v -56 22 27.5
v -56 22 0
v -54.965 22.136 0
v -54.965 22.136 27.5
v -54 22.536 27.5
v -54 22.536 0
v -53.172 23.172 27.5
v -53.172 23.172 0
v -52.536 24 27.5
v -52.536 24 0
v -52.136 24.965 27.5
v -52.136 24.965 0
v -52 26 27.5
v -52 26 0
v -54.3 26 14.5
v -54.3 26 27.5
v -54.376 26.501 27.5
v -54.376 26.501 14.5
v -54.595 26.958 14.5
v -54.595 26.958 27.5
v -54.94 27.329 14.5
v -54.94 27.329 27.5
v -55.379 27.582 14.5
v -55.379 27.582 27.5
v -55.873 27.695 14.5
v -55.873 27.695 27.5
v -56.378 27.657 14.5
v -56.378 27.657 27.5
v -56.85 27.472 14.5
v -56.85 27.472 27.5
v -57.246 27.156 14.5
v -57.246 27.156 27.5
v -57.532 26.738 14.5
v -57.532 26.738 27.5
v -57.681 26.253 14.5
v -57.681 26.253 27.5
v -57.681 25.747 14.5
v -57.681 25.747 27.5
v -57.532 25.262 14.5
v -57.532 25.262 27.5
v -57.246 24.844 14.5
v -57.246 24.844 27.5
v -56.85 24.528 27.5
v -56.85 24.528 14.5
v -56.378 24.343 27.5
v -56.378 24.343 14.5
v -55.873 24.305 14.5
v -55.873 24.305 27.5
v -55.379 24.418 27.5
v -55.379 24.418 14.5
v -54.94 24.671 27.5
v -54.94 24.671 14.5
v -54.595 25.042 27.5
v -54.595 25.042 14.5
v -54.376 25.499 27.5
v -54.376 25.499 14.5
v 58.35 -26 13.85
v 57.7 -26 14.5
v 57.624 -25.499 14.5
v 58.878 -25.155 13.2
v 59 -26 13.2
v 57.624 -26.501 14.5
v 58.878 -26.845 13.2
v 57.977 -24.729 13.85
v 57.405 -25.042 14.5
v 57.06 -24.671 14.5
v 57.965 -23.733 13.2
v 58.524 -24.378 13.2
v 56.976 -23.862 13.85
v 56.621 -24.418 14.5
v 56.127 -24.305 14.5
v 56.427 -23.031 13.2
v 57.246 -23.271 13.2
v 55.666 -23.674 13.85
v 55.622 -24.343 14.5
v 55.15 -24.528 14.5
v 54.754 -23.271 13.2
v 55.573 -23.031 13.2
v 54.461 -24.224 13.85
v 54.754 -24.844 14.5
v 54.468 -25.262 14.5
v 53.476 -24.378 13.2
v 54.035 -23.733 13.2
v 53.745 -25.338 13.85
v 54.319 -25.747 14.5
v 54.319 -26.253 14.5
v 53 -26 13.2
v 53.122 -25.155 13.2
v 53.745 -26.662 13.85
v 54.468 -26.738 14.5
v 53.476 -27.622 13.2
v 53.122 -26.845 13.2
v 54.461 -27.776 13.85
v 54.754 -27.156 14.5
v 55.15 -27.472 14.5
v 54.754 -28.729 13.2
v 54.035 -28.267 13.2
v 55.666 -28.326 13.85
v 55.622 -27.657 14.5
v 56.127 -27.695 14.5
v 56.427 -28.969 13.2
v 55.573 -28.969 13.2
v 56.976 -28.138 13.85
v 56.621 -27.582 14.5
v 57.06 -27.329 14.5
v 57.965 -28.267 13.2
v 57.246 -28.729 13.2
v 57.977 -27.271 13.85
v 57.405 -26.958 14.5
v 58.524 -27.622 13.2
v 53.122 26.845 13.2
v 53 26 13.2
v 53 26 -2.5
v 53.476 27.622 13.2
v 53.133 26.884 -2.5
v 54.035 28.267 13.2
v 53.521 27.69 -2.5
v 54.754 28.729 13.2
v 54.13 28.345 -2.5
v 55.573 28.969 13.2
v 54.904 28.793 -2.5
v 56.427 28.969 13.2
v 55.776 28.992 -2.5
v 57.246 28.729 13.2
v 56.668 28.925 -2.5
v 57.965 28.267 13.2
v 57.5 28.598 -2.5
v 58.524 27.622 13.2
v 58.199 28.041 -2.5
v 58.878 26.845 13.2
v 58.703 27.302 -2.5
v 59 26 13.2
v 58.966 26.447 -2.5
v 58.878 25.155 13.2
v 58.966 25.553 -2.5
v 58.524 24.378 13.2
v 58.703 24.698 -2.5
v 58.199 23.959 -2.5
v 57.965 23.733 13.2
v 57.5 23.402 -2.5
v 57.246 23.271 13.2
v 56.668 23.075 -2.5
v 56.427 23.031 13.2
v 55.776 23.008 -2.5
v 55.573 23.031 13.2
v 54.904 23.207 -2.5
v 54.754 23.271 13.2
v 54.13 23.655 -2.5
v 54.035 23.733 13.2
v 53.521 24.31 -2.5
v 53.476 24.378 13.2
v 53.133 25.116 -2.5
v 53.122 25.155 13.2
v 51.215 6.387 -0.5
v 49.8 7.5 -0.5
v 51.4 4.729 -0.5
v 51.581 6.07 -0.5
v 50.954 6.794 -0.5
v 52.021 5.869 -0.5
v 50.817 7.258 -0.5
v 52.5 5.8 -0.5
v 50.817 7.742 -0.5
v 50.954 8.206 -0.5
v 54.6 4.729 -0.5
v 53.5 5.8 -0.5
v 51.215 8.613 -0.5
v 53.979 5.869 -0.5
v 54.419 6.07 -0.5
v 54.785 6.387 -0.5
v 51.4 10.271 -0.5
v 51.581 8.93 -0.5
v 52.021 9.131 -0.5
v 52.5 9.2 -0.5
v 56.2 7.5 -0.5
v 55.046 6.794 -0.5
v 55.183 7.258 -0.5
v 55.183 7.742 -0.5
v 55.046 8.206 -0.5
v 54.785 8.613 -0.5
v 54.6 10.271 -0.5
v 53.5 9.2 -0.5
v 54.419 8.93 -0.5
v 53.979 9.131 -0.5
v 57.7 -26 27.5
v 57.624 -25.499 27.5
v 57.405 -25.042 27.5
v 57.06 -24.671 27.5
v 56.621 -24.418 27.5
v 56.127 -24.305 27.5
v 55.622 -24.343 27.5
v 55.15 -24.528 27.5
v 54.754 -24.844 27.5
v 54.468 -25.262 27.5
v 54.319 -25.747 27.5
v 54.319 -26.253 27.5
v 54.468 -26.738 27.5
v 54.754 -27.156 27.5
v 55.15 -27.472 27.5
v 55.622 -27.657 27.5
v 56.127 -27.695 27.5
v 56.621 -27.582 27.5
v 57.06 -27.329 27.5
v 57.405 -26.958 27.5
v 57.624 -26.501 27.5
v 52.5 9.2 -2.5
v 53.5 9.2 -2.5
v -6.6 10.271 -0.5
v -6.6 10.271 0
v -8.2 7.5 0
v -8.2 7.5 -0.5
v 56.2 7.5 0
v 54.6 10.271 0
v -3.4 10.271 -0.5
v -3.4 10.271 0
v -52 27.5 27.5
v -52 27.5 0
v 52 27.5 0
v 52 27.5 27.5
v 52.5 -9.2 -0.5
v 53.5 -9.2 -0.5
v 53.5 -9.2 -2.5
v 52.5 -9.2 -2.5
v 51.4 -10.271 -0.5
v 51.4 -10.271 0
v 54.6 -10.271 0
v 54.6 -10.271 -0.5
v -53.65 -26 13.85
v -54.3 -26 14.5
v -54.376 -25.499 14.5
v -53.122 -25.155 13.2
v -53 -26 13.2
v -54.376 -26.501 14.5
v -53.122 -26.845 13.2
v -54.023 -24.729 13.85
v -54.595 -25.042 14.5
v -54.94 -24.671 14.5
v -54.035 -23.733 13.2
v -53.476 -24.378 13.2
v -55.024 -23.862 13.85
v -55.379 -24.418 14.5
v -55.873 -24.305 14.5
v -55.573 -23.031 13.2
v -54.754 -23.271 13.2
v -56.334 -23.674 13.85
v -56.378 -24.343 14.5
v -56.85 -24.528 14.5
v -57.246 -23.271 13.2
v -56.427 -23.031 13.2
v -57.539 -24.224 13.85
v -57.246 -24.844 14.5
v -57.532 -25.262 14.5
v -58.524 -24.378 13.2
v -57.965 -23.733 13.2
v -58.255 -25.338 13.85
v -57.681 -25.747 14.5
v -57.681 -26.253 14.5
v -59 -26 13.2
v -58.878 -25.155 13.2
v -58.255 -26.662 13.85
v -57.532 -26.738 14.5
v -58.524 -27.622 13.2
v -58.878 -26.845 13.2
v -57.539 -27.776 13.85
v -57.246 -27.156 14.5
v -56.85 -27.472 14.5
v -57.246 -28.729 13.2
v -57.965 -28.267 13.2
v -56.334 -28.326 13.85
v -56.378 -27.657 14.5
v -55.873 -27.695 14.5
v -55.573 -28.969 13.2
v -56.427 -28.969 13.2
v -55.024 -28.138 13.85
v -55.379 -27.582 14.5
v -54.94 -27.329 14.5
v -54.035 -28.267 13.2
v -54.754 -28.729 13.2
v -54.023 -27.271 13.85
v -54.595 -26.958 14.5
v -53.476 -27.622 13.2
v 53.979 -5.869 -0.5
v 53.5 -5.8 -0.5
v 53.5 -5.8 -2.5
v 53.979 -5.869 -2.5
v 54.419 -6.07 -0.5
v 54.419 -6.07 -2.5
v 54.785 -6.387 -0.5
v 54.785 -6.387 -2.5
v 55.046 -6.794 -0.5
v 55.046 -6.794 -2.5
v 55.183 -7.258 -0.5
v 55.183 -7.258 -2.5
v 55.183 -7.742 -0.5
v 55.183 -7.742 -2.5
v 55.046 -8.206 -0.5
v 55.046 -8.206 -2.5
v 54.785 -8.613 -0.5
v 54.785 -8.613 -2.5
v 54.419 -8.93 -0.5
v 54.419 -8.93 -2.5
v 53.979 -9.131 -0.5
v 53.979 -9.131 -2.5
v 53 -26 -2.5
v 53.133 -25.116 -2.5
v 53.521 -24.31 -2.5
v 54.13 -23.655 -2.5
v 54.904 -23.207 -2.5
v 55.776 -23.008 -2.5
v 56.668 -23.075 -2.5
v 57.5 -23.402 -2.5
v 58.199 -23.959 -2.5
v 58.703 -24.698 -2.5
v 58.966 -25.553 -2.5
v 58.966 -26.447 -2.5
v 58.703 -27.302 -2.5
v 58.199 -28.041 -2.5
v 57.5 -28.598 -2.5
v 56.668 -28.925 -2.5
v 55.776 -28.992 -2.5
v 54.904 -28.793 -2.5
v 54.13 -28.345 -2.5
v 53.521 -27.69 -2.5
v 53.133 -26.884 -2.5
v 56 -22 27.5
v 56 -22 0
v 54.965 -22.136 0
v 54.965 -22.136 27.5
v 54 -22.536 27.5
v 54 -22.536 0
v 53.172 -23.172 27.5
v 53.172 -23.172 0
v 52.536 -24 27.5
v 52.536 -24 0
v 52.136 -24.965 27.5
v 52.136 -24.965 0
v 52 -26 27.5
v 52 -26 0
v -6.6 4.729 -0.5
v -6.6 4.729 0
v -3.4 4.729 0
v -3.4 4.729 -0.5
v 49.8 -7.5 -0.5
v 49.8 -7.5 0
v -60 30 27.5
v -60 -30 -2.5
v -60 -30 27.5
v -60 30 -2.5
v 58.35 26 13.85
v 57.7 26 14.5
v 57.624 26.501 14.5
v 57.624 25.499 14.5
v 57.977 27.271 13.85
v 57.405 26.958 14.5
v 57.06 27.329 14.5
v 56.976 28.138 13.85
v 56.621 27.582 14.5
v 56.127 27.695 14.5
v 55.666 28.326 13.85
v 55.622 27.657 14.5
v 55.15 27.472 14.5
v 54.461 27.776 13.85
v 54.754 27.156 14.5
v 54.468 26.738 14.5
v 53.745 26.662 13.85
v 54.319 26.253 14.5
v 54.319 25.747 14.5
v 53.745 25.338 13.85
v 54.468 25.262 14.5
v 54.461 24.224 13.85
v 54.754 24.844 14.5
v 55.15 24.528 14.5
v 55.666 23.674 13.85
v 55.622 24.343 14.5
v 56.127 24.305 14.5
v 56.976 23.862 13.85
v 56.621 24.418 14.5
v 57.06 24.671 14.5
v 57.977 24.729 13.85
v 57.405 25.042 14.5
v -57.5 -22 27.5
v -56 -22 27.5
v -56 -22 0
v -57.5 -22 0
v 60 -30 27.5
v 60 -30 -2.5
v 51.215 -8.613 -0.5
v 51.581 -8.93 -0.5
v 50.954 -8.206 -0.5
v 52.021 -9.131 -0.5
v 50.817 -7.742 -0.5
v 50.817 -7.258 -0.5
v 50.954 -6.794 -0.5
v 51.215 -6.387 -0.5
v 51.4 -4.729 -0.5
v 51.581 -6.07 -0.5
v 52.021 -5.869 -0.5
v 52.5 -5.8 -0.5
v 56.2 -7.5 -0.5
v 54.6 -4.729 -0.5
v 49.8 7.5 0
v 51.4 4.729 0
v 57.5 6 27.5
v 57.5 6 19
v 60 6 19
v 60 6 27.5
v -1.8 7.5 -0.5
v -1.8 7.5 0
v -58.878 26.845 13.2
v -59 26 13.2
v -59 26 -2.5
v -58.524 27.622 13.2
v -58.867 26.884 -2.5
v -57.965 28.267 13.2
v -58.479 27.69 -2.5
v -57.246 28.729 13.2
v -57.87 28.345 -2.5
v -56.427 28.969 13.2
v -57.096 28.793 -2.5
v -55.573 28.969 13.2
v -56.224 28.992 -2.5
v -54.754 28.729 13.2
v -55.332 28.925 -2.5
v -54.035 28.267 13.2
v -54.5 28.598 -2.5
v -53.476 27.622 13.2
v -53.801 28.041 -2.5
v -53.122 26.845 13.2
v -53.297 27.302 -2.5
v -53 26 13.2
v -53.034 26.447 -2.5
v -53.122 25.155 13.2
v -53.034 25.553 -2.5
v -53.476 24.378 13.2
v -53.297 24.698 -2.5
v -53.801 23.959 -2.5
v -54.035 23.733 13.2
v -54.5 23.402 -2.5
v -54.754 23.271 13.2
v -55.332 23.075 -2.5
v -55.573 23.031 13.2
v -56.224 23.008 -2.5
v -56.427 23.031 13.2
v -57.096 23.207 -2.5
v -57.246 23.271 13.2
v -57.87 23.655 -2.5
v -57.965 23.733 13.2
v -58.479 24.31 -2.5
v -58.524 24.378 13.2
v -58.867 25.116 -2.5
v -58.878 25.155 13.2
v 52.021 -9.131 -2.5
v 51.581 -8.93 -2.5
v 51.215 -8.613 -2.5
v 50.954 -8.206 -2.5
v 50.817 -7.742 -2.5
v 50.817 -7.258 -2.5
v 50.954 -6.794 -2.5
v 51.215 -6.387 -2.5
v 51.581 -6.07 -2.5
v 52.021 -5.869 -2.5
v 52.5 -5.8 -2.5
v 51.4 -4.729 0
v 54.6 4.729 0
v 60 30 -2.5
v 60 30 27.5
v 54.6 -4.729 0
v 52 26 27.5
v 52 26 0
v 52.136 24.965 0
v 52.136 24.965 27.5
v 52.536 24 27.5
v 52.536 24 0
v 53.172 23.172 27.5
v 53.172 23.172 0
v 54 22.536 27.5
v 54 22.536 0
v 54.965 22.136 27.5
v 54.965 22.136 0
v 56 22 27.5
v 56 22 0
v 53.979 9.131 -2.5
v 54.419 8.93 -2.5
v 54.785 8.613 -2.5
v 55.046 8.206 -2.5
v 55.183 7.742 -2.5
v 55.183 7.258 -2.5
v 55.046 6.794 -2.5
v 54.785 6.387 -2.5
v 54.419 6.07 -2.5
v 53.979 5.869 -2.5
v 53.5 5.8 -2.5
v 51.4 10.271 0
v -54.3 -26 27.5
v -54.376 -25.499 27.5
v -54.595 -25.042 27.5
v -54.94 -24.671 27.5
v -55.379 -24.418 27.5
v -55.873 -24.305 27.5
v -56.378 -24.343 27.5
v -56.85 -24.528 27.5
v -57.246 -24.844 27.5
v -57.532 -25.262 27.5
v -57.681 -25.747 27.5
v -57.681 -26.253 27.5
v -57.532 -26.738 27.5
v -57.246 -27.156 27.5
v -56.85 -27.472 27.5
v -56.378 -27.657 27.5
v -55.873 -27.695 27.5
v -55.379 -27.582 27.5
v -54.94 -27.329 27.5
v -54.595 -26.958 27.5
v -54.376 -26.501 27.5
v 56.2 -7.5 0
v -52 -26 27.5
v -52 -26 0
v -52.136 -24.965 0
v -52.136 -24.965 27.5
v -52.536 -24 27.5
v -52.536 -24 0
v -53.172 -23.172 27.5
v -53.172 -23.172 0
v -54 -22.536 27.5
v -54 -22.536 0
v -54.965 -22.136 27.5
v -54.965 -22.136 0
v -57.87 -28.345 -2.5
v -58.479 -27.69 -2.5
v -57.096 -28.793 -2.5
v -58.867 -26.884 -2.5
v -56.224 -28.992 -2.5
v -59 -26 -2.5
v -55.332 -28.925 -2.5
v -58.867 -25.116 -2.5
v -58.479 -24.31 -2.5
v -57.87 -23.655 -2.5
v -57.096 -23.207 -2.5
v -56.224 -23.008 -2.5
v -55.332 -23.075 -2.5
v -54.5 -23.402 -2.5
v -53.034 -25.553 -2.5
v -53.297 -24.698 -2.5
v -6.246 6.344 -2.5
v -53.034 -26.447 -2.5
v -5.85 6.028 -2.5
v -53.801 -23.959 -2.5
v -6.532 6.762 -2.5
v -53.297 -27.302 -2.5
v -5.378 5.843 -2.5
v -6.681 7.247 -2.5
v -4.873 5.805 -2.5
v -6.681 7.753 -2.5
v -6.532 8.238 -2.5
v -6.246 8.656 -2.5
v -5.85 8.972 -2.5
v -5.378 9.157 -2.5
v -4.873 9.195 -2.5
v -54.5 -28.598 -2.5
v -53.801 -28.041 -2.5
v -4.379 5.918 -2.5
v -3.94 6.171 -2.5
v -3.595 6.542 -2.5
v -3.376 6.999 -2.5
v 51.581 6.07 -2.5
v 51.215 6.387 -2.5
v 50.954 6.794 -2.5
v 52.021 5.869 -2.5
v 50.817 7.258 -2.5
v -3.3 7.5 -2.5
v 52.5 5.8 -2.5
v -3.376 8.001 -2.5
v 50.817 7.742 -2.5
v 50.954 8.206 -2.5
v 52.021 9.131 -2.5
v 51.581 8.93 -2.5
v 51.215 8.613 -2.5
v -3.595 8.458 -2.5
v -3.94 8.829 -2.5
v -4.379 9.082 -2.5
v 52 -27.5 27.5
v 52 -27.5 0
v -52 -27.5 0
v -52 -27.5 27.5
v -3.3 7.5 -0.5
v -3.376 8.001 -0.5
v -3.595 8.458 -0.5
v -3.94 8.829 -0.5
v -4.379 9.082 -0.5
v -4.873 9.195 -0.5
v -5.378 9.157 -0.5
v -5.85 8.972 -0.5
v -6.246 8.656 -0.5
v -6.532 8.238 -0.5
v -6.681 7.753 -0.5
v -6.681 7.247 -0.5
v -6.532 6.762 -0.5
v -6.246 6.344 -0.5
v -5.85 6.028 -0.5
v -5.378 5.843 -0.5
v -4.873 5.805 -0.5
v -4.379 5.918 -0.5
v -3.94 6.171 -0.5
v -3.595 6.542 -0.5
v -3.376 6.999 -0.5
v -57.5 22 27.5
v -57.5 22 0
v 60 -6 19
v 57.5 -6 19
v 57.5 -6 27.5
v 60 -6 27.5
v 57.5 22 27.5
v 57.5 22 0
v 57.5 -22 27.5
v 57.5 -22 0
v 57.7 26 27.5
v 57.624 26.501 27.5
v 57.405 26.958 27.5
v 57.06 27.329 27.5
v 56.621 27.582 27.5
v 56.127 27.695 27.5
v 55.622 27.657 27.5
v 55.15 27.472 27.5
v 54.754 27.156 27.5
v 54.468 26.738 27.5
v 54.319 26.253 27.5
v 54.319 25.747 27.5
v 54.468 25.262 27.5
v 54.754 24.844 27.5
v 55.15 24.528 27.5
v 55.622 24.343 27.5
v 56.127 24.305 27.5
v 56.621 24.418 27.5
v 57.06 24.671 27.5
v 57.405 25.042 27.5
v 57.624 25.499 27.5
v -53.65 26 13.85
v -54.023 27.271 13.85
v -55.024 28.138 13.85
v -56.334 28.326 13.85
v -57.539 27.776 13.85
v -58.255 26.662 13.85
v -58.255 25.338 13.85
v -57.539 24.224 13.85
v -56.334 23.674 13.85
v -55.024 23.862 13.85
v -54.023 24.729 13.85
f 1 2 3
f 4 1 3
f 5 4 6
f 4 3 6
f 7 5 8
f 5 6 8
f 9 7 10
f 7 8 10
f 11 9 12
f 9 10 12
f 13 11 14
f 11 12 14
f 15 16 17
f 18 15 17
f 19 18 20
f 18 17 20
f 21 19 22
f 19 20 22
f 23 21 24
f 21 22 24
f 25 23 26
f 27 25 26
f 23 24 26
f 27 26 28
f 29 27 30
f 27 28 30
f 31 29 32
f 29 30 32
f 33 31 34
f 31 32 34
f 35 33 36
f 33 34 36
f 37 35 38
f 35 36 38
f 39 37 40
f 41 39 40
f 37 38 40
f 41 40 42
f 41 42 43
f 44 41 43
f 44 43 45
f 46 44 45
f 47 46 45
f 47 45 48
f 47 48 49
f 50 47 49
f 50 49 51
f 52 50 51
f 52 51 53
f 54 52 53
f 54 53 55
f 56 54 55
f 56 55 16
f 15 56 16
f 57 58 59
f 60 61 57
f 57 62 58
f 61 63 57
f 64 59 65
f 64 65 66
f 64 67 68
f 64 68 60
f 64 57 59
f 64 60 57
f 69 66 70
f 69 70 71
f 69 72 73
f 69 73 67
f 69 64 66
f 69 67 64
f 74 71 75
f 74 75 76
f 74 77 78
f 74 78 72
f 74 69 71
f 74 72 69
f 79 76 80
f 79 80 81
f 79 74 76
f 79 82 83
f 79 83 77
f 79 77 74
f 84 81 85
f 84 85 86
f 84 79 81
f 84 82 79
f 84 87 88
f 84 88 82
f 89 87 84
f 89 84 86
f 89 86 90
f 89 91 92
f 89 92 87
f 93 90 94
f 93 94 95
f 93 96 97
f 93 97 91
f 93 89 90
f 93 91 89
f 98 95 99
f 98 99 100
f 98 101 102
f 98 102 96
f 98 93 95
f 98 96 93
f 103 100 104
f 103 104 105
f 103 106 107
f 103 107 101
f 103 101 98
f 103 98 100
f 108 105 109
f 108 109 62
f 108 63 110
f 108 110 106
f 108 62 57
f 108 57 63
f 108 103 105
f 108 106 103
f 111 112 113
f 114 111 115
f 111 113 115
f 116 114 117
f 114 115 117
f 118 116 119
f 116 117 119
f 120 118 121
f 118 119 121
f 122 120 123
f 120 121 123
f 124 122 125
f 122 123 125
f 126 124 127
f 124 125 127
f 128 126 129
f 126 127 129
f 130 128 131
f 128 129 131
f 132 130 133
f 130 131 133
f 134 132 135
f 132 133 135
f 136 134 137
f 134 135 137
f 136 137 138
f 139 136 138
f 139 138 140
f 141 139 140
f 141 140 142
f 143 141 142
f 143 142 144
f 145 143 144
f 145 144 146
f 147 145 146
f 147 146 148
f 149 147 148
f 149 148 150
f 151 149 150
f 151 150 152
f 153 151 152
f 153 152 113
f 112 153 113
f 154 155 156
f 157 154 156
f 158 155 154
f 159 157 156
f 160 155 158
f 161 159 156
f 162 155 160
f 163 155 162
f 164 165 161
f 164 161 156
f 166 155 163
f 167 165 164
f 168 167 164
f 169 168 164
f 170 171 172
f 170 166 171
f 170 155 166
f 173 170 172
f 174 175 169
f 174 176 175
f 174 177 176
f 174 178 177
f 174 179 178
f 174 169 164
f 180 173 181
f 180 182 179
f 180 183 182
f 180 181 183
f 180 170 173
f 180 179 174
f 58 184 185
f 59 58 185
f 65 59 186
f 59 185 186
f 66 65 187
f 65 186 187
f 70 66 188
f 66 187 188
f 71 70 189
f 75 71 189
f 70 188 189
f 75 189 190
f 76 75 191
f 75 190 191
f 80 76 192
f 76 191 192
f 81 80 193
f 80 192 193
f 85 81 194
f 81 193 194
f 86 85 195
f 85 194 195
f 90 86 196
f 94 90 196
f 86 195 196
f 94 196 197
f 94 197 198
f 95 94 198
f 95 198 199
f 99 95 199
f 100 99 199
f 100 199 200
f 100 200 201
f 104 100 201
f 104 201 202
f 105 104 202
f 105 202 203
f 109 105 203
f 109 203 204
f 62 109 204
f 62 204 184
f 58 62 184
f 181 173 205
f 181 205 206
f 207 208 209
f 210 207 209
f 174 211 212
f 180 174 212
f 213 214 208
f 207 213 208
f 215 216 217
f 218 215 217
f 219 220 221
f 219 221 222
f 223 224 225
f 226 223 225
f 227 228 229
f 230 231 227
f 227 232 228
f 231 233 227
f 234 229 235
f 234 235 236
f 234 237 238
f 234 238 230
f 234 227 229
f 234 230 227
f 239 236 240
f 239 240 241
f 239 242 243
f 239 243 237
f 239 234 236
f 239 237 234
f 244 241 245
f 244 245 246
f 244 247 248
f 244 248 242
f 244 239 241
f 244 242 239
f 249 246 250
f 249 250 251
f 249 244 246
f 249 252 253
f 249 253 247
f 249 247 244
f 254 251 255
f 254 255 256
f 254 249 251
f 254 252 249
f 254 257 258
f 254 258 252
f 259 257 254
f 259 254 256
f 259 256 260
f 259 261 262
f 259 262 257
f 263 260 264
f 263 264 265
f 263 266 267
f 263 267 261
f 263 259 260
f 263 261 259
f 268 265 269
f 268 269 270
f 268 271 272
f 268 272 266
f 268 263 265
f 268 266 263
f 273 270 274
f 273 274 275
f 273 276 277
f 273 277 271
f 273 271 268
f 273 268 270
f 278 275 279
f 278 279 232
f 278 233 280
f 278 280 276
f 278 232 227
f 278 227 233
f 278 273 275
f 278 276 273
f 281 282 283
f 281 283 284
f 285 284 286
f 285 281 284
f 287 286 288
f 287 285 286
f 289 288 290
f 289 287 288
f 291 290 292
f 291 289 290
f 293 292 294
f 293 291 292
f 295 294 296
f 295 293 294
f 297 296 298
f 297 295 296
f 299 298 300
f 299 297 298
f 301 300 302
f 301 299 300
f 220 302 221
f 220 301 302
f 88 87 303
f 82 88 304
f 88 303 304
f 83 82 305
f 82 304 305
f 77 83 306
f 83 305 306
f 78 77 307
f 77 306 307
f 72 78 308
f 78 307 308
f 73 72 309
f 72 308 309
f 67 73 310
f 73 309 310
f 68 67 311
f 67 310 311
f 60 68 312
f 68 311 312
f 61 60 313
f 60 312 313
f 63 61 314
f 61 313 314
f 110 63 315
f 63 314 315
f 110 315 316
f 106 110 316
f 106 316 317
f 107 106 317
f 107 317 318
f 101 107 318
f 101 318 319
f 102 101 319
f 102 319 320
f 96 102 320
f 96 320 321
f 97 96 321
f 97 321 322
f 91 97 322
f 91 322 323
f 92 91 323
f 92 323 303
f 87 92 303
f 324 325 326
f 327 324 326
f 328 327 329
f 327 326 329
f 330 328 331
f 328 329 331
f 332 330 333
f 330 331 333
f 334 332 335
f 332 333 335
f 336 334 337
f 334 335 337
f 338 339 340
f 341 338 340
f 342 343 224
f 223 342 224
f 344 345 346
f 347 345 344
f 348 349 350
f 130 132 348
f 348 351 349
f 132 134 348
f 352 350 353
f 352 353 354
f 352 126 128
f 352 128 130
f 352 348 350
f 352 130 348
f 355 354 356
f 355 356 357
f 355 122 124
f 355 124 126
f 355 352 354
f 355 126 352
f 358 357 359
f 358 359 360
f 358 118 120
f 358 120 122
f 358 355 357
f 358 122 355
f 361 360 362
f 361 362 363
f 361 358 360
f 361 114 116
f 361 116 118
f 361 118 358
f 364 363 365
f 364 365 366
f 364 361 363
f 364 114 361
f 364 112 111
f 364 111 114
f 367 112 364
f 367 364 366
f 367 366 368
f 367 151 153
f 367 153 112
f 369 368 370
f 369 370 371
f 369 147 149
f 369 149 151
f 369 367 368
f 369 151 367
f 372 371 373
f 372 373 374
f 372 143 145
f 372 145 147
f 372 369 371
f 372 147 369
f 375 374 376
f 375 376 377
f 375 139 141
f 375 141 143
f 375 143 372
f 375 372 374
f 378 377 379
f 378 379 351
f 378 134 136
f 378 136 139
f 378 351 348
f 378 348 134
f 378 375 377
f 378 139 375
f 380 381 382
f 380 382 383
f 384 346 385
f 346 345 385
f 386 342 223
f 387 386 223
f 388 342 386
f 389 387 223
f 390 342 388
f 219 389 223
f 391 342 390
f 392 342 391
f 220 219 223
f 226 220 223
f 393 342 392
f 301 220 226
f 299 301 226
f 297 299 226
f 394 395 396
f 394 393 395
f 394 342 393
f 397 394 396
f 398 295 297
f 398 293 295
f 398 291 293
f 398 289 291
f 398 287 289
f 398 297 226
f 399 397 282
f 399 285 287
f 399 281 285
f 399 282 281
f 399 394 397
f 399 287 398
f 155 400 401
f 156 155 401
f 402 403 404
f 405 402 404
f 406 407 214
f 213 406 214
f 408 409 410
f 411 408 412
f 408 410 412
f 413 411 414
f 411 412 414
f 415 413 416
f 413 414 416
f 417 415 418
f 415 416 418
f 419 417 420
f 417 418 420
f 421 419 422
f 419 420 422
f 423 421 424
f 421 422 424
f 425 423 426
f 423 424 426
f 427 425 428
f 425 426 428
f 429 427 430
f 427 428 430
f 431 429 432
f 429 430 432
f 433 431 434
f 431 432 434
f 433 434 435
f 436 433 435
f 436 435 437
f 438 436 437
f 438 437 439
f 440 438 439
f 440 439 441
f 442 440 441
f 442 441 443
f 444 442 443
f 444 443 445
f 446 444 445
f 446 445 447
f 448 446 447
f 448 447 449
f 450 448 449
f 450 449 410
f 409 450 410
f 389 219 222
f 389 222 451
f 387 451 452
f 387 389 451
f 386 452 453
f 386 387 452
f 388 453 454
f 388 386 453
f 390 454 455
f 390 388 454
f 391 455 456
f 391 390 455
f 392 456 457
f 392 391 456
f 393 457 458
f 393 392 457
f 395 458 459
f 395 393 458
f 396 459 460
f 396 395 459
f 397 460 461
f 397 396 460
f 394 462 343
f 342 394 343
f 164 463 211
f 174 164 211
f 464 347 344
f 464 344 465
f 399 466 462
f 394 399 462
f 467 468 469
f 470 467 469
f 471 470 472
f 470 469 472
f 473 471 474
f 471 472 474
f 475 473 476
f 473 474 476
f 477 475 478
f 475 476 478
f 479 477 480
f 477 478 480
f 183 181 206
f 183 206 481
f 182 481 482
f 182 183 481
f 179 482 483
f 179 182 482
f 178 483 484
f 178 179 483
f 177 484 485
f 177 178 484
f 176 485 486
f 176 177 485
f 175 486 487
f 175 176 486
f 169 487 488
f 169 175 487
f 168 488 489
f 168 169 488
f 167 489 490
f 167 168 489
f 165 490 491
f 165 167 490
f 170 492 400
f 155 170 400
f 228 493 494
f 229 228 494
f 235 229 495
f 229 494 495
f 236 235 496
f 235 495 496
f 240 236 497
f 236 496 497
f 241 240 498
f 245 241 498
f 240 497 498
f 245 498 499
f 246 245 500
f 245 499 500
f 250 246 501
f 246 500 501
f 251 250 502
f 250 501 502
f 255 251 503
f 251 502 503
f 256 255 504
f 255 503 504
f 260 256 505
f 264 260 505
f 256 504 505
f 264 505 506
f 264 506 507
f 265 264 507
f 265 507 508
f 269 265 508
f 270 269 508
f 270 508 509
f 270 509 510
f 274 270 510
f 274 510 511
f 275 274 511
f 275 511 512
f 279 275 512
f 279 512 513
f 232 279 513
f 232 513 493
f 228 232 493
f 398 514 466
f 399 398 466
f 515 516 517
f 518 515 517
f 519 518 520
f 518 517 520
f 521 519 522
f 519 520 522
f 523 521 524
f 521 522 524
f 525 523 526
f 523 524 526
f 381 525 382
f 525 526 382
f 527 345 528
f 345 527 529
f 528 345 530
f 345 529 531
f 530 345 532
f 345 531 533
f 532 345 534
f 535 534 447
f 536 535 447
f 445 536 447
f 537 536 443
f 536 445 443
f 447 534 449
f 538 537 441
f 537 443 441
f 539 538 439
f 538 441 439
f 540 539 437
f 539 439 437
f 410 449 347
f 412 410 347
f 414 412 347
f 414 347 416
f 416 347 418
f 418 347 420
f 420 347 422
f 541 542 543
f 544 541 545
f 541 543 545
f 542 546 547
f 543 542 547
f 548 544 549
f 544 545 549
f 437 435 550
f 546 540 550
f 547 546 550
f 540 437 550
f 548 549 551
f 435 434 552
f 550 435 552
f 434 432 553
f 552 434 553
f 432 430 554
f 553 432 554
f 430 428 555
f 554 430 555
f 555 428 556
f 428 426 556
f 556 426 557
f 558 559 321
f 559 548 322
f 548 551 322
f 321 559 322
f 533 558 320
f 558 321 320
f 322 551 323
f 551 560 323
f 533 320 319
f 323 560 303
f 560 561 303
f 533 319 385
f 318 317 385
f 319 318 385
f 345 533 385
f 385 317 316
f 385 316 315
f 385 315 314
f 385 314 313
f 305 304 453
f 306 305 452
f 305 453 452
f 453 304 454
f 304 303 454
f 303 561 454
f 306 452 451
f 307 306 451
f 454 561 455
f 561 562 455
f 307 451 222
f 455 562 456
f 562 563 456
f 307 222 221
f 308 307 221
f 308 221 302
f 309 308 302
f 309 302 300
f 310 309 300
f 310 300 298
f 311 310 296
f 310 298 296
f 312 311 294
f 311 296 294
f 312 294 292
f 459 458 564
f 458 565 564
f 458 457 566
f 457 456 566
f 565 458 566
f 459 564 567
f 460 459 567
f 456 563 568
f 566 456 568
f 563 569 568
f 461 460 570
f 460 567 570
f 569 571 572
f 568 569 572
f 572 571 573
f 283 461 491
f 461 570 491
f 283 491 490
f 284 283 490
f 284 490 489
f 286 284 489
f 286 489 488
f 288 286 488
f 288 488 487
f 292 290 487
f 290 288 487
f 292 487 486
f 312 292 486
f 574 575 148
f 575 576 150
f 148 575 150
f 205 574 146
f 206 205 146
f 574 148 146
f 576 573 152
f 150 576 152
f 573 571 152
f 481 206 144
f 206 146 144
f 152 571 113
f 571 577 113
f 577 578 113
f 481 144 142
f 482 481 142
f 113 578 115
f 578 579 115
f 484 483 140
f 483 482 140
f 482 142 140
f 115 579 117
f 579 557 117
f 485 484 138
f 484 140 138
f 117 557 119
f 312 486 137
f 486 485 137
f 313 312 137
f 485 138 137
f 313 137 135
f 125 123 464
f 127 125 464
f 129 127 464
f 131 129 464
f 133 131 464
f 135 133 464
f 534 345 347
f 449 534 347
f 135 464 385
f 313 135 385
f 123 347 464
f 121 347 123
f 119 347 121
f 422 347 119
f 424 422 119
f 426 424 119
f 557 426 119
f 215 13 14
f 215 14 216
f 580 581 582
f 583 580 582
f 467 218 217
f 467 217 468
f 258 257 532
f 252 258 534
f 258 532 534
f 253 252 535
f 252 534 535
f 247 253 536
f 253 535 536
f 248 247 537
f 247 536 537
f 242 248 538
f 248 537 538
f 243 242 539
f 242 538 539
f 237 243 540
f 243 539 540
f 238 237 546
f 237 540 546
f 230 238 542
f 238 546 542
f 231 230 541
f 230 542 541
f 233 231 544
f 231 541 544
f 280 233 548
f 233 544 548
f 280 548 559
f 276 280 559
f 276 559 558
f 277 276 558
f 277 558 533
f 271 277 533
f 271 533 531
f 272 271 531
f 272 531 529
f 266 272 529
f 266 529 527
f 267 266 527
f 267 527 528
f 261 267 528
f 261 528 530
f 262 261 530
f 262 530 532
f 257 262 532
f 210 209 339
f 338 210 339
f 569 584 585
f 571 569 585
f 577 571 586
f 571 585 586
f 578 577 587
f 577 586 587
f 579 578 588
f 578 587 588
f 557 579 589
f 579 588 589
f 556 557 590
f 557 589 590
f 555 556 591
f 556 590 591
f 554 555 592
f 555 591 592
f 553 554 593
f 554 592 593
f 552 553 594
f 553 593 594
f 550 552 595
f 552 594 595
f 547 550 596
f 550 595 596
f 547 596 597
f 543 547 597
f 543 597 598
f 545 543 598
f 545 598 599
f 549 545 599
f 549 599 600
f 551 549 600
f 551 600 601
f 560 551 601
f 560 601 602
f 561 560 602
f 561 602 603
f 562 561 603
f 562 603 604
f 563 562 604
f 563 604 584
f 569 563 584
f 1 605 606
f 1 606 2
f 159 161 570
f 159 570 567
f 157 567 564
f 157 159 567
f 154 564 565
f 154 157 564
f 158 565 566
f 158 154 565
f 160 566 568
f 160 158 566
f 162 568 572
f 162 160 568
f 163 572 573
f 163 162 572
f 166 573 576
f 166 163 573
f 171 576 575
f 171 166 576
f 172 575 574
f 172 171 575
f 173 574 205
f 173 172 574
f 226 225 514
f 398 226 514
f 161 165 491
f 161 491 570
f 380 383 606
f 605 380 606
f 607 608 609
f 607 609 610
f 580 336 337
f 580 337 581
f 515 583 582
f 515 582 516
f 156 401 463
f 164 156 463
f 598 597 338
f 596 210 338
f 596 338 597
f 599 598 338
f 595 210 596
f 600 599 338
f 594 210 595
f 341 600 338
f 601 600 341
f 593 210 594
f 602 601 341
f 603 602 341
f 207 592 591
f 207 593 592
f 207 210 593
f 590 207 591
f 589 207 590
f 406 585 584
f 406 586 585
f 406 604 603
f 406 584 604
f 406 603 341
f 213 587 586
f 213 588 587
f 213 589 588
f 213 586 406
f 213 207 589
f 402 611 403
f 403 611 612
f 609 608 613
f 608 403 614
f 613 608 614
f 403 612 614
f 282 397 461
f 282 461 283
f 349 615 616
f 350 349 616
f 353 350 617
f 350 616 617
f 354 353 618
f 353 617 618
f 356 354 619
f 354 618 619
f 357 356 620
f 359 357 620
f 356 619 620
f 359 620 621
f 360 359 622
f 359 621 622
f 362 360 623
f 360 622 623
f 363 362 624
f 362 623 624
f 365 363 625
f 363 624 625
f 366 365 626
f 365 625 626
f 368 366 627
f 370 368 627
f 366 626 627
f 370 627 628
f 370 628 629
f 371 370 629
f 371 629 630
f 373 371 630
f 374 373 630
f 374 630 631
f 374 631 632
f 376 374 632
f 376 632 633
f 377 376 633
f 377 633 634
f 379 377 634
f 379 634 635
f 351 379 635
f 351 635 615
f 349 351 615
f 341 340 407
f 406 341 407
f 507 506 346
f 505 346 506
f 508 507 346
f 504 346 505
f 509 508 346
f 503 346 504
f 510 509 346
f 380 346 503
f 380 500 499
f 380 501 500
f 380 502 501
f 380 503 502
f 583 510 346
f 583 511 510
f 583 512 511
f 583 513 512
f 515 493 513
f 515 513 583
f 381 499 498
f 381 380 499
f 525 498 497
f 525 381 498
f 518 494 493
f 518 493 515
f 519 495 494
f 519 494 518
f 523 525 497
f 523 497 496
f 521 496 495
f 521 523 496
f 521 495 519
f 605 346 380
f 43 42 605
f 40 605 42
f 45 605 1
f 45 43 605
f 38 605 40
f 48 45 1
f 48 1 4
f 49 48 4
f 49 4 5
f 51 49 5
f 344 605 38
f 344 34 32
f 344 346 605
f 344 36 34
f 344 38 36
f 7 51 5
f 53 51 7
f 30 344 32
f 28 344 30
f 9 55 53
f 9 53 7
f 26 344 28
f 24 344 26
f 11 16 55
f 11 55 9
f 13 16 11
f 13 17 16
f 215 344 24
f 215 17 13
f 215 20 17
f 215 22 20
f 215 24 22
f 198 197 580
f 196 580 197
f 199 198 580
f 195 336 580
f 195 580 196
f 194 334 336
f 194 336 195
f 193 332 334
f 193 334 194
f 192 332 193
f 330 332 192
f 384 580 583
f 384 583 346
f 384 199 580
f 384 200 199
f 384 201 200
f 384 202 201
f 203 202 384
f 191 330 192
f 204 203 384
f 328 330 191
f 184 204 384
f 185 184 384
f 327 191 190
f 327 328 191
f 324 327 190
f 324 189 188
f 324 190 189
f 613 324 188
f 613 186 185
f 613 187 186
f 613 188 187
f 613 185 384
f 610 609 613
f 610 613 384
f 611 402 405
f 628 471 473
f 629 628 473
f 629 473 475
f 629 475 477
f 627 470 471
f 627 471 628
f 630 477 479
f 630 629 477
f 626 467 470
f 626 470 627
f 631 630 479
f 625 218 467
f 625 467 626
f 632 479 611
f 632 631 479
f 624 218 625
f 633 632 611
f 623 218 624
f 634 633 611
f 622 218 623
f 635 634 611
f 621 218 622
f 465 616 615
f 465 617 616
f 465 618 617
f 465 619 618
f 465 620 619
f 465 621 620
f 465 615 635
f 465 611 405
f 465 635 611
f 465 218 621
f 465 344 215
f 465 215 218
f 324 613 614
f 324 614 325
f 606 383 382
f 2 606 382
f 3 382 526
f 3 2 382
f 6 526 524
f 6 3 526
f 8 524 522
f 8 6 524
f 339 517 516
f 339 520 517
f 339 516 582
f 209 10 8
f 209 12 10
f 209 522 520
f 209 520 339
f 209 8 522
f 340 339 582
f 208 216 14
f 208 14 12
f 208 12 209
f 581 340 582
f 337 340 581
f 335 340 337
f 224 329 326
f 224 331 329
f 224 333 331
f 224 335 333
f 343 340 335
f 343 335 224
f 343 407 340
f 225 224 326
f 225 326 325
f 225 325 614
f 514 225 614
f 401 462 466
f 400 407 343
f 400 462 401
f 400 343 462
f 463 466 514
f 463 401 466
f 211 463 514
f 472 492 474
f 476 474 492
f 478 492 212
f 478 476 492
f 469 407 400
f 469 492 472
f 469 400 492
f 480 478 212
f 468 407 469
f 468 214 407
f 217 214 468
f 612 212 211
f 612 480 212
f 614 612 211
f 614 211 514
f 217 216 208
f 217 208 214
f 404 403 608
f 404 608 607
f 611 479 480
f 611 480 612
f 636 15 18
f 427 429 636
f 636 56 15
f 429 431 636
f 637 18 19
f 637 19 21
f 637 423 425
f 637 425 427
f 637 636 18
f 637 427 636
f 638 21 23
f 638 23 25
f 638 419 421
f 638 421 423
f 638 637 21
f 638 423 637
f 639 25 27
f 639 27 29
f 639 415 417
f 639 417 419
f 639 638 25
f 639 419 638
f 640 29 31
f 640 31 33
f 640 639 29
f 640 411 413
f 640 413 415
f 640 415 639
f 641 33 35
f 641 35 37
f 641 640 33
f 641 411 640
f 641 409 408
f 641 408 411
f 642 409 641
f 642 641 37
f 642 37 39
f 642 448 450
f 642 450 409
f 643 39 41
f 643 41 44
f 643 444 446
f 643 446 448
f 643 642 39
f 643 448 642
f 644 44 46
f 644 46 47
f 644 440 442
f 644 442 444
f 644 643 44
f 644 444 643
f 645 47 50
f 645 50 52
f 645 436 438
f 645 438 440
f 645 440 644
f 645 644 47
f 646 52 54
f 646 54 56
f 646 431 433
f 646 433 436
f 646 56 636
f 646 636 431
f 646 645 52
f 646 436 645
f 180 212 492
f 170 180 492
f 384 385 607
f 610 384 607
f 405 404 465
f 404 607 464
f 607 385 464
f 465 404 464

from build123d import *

# Parameters (mm, degrees)
SKETCH_1_W          = 120
SKETCH_1_H          = 60
EXTRUDE_1_DEPTH     = 2.5
SKETCH_1_3_W        = 120
SKETCH_1_3_H        = 60
EXTRUDE_2_DEPTH     = 27.5
SKETCH_2_R          = 1.7
CUT_EXTRUDE_1_DEPTH = 74.484692283
SKETCH_3_R          = 1.7
CUT_EXTRUDE_2_DEPTH = 73.5
CUT_EXTRUDE_3_DEPTH = 0.5
SKETCH_5_W          = 2.5
SKETCH_5_H          = 12
CUT_EXTRUDE_4_DEPTH = 8.5
SKETCH_6_R          = 3
CUT_EXTRUDE_5_DEPTH = 15
CHAMFER_1_SIZE      = 2


with BuildPart() as part:
    # 草图1 → 凸台-拉伸1 (new body)
    with BuildSketch(Plane.XY):
        Rectangle(SKETCH_1_W, SKETCH_1_H)
    extrude(amount=-EXTRUDE_1_DEPTH)

    # 草图1<3> → 凸台-拉伸2 (add)
    with BuildSketch(Plane.XY):
        Rectangle(SKETCH_1_3_W, SKETCH_1_3_H)
        with BuildLine():
            Line((-52, 27.5), (52, 27.5))
            Line((52, 27.5), (52, 26))
            ThreePointArc((52, 26), (53.171572875, 23.171572875), (56, 22))
            Line((56, 22), (57.5, 22))
            Line((57.5, 22), (57.5, -22))
            Line((57.5, -22), (56, -22))
            ThreePointArc((56, -22), (53.171572875, -23.171572875), (52, -26))
            Line((52, -26), (52, -27.5))
            Line((52, -27.5), (-52, -27.5))
            Line((-52, -27.5), (-52, -26))
            ThreePointArc((-52, -26), (-53.171572875, -23.171572875), (-56, -22))
            Line((-56, -22), (-57.5, -22))
            Line((-57.5, -22), (-57.5, 22))
            Line((-57.5, 22), (-56, 22))
            ThreePointArc((-56, 22), (-53.171572875, 23.171572875), (-52, 26))
            Line((-52, 26), (-52, 27.5))
        make_face(mode=Mode.SUBTRACT)
    extrude(amount=EXTRUDE_2_DEPTH)

    # 草图2 → 切除-拉伸1 (cut, through all)
    with BuildSketch(Plane.XY.offset(27.5)):
        with Locations((-56, 26)):
            Circle(SKETCH_2_R)
        with Locations((56, 26)):
            Circle(SKETCH_2_R)
        with Locations((56, -26)):
            Circle(SKETCH_2_R)
        with Locations((-56, -26)):
            Circle(SKETCH_2_R)
    extrude(amount=-CUT_EXTRUDE_1_DEPTH, mode=Mode.SUBTRACT)

    # 草图3 → 切除-拉伸2 (cut, through all)
    with BuildSketch(Plane.XY):
        with Locations((-5, 7.5)):
            Circle(SKETCH_3_R)
        with BuildLine():
            Line((52.5, 9.2), (53.5, 9.2))
            ThreePointArc((53.5, 9.2), (55.2, 7.5), (53.5, 5.8))
            Line((53.5, 5.8), (52.5, 5.8))
            ThreePointArc((52.5, 5.8), (50.8, 7.5), (52.5, 9.2))
        make_face()
        with BuildLine():
            Line((52.5, -5.8), (53.5, -5.8))
            ThreePointArc((53.5, -5.8), (55.2, -7.5), (53.5, -9.2))
            Line((53.5, -9.2), (52.5, -9.2))
            ThreePointArc((52.5, -9.2), (50.8, -7.5), (52.5, -5.8))
        make_face()
    extrude(amount=-CUT_EXTRUDE_2_DEPTH, mode=Mode.SUBTRACT)

    # 草图4 → 切除-拉伸3 (cut)
    with BuildSketch(Plane.XY):
        Polygon((-1.8, 7.5), (-3.4, 10.271281292), (-6.6, 10.271281292), (-8.2, 7.5), (-6.6, 4.728718708), (-3.4, 4.728718708), align=None)
        Polygon((56.2, 7.5), (54.6, 10.271281292), (51.4, 10.271281292), (49.8, 7.5), (51.4, 4.728718708), (54.6, 4.728718708), align=None)
        Polygon((56.2, -7.5), (54.6, -4.728718708), (51.4, -4.728718708), (49.8, -7.5), (51.4, -10.271281292), (54.6, -10.271281292), align=None)
    extrude(amount=-CUT_EXTRUDE_3_DEPTH, mode=Mode.SUBTRACT)

    # 草图5 → 切除-拉伸4 (cut)
    with BuildSketch(Plane.XY.offset(27.5)):
        with Locations((58.75, 0)):
            Rectangle(SKETCH_5_W, SKETCH_5_H)
    extrude(amount=-CUT_EXTRUDE_4_DEPTH, mode=Mode.SUBTRACT)

    # 草图6 → 切除-拉伸5 (cut)
    with BuildSketch(Plane(origin=(0, 0, -2.5), x_dir=(-1, 0, 0), z_dir=(0, 0, -1))):
        with Locations((-56, 26)):
            Circle(SKETCH_6_R)
        with Locations((-56, -26)):
            Circle(SKETCH_6_R)
        with Locations((56, -26)):
            Circle(SKETCH_6_R)
        with Locations((56, 26)):
            Circle(SKETCH_6_R)
    extrude(amount=-CUT_EXTRUDE_5_DEPTH, mode=Mode.SUBTRACT)

    # 倒角1
    # the kernel refuses this chamfer: 2 mm, written as the material it takes off along each edge
    with BuildSketch(Plane(origin=(-56, 26, 12.5), x_dir=(1, 0, 0), z_dir=(0, -1, 0))) as chamfer_1_piece_1_section:
        Polygon((1.7, CHAMFER_1_SIZE), (1.7 + CHAMFER_1_SIZE, 0), (1.7, 0), align=None)
    chamfer_1_piece_1 = revolve(axis=Axis((-56, 26, 12.5), (0, 0, 1)), mode=Mode.PRIVATE)
    chamfer_1_piece_1 = chamfer_1_piece_1 & Plane(origin=(-56, 26, 13.857190975), x_dir=(-1, 0, 0), z_dir=(0, 0, -1)) * Cylinder(3, 15, mode=Mode.PRIVATE)
    add(chamfer_1_piece_1, mode=Mode.SUBTRACT)
    with BuildSketch(Plane(origin=(-56, -26, 12.5), x_dir=(1, 0, 0), z_dir=(0, -1, 0))) as chamfer_1_piece_2_section:
        Polygon((1.7, CHAMFER_1_SIZE), (1.7 + CHAMFER_1_SIZE, 0), (1.7, 0), align=None)
    chamfer_1_piece_2 = revolve(axis=Axis((-56, -26, 12.5), (0, 0, 1)), mode=Mode.PRIVATE)
    chamfer_1_piece_2 = chamfer_1_piece_2 & Plane(origin=(-56, -26, 13.857190975), x_dir=(-1, 0, 0), z_dir=(0, 0, -1)) * Cylinder(3, 15, mode=Mode.PRIVATE)
    add(chamfer_1_piece_2, mode=Mode.SUBTRACT)
    with BuildSketch(Plane(origin=(56, -26, 12.5), x_dir=(1, 0, 0), z_dir=(0, -1, 0))) as chamfer_1_piece_3_section:
        Polygon((1.7, CHAMFER_1_SIZE), (1.7 + CHAMFER_1_SIZE, 0), (1.7, 0), align=None)
    chamfer_1_piece_3 = revolve(axis=Axis((56, -26, 12.5), (0, 0, 1)), mode=Mode.PRIVATE)
    chamfer_1_piece_3 = chamfer_1_piece_3 & Plane(origin=(56, -26, 13.857190975), x_dir=(-1, 0, 0), z_dir=(0, 0, -1)) * Cylinder(3, 15, mode=Mode.PRIVATE)
    add(chamfer_1_piece_3, mode=Mode.SUBTRACT)
    with BuildSketch(Plane(origin=(56, 26, 12.5), x_dir=(1, 0, 0), z_dir=(0, -1, 0))) as chamfer_1_piece_4_section:
        Polygon((1.7, CHAMFER_1_SIZE), (1.7 + CHAMFER_1_SIZE, 0), (1.7, 0), align=None)
    chamfer_1_piece_4 = revolve(axis=Axis((56, 26, 12.5), (0, 0, 1)), mode=Mode.PRIVATE)
    chamfer_1_piece_4 = chamfer_1_piece_4 & Plane(origin=(56, 26, 13.857190975), x_dir=(-1, 0, 0), z_dir=(0, 0, -1)) * Cylinder(3, 15, mode=Mode.PRIVATE)
    add(chamfer_1_piece_4, mode=Mode.SUBTRACT)


solid = part.part
